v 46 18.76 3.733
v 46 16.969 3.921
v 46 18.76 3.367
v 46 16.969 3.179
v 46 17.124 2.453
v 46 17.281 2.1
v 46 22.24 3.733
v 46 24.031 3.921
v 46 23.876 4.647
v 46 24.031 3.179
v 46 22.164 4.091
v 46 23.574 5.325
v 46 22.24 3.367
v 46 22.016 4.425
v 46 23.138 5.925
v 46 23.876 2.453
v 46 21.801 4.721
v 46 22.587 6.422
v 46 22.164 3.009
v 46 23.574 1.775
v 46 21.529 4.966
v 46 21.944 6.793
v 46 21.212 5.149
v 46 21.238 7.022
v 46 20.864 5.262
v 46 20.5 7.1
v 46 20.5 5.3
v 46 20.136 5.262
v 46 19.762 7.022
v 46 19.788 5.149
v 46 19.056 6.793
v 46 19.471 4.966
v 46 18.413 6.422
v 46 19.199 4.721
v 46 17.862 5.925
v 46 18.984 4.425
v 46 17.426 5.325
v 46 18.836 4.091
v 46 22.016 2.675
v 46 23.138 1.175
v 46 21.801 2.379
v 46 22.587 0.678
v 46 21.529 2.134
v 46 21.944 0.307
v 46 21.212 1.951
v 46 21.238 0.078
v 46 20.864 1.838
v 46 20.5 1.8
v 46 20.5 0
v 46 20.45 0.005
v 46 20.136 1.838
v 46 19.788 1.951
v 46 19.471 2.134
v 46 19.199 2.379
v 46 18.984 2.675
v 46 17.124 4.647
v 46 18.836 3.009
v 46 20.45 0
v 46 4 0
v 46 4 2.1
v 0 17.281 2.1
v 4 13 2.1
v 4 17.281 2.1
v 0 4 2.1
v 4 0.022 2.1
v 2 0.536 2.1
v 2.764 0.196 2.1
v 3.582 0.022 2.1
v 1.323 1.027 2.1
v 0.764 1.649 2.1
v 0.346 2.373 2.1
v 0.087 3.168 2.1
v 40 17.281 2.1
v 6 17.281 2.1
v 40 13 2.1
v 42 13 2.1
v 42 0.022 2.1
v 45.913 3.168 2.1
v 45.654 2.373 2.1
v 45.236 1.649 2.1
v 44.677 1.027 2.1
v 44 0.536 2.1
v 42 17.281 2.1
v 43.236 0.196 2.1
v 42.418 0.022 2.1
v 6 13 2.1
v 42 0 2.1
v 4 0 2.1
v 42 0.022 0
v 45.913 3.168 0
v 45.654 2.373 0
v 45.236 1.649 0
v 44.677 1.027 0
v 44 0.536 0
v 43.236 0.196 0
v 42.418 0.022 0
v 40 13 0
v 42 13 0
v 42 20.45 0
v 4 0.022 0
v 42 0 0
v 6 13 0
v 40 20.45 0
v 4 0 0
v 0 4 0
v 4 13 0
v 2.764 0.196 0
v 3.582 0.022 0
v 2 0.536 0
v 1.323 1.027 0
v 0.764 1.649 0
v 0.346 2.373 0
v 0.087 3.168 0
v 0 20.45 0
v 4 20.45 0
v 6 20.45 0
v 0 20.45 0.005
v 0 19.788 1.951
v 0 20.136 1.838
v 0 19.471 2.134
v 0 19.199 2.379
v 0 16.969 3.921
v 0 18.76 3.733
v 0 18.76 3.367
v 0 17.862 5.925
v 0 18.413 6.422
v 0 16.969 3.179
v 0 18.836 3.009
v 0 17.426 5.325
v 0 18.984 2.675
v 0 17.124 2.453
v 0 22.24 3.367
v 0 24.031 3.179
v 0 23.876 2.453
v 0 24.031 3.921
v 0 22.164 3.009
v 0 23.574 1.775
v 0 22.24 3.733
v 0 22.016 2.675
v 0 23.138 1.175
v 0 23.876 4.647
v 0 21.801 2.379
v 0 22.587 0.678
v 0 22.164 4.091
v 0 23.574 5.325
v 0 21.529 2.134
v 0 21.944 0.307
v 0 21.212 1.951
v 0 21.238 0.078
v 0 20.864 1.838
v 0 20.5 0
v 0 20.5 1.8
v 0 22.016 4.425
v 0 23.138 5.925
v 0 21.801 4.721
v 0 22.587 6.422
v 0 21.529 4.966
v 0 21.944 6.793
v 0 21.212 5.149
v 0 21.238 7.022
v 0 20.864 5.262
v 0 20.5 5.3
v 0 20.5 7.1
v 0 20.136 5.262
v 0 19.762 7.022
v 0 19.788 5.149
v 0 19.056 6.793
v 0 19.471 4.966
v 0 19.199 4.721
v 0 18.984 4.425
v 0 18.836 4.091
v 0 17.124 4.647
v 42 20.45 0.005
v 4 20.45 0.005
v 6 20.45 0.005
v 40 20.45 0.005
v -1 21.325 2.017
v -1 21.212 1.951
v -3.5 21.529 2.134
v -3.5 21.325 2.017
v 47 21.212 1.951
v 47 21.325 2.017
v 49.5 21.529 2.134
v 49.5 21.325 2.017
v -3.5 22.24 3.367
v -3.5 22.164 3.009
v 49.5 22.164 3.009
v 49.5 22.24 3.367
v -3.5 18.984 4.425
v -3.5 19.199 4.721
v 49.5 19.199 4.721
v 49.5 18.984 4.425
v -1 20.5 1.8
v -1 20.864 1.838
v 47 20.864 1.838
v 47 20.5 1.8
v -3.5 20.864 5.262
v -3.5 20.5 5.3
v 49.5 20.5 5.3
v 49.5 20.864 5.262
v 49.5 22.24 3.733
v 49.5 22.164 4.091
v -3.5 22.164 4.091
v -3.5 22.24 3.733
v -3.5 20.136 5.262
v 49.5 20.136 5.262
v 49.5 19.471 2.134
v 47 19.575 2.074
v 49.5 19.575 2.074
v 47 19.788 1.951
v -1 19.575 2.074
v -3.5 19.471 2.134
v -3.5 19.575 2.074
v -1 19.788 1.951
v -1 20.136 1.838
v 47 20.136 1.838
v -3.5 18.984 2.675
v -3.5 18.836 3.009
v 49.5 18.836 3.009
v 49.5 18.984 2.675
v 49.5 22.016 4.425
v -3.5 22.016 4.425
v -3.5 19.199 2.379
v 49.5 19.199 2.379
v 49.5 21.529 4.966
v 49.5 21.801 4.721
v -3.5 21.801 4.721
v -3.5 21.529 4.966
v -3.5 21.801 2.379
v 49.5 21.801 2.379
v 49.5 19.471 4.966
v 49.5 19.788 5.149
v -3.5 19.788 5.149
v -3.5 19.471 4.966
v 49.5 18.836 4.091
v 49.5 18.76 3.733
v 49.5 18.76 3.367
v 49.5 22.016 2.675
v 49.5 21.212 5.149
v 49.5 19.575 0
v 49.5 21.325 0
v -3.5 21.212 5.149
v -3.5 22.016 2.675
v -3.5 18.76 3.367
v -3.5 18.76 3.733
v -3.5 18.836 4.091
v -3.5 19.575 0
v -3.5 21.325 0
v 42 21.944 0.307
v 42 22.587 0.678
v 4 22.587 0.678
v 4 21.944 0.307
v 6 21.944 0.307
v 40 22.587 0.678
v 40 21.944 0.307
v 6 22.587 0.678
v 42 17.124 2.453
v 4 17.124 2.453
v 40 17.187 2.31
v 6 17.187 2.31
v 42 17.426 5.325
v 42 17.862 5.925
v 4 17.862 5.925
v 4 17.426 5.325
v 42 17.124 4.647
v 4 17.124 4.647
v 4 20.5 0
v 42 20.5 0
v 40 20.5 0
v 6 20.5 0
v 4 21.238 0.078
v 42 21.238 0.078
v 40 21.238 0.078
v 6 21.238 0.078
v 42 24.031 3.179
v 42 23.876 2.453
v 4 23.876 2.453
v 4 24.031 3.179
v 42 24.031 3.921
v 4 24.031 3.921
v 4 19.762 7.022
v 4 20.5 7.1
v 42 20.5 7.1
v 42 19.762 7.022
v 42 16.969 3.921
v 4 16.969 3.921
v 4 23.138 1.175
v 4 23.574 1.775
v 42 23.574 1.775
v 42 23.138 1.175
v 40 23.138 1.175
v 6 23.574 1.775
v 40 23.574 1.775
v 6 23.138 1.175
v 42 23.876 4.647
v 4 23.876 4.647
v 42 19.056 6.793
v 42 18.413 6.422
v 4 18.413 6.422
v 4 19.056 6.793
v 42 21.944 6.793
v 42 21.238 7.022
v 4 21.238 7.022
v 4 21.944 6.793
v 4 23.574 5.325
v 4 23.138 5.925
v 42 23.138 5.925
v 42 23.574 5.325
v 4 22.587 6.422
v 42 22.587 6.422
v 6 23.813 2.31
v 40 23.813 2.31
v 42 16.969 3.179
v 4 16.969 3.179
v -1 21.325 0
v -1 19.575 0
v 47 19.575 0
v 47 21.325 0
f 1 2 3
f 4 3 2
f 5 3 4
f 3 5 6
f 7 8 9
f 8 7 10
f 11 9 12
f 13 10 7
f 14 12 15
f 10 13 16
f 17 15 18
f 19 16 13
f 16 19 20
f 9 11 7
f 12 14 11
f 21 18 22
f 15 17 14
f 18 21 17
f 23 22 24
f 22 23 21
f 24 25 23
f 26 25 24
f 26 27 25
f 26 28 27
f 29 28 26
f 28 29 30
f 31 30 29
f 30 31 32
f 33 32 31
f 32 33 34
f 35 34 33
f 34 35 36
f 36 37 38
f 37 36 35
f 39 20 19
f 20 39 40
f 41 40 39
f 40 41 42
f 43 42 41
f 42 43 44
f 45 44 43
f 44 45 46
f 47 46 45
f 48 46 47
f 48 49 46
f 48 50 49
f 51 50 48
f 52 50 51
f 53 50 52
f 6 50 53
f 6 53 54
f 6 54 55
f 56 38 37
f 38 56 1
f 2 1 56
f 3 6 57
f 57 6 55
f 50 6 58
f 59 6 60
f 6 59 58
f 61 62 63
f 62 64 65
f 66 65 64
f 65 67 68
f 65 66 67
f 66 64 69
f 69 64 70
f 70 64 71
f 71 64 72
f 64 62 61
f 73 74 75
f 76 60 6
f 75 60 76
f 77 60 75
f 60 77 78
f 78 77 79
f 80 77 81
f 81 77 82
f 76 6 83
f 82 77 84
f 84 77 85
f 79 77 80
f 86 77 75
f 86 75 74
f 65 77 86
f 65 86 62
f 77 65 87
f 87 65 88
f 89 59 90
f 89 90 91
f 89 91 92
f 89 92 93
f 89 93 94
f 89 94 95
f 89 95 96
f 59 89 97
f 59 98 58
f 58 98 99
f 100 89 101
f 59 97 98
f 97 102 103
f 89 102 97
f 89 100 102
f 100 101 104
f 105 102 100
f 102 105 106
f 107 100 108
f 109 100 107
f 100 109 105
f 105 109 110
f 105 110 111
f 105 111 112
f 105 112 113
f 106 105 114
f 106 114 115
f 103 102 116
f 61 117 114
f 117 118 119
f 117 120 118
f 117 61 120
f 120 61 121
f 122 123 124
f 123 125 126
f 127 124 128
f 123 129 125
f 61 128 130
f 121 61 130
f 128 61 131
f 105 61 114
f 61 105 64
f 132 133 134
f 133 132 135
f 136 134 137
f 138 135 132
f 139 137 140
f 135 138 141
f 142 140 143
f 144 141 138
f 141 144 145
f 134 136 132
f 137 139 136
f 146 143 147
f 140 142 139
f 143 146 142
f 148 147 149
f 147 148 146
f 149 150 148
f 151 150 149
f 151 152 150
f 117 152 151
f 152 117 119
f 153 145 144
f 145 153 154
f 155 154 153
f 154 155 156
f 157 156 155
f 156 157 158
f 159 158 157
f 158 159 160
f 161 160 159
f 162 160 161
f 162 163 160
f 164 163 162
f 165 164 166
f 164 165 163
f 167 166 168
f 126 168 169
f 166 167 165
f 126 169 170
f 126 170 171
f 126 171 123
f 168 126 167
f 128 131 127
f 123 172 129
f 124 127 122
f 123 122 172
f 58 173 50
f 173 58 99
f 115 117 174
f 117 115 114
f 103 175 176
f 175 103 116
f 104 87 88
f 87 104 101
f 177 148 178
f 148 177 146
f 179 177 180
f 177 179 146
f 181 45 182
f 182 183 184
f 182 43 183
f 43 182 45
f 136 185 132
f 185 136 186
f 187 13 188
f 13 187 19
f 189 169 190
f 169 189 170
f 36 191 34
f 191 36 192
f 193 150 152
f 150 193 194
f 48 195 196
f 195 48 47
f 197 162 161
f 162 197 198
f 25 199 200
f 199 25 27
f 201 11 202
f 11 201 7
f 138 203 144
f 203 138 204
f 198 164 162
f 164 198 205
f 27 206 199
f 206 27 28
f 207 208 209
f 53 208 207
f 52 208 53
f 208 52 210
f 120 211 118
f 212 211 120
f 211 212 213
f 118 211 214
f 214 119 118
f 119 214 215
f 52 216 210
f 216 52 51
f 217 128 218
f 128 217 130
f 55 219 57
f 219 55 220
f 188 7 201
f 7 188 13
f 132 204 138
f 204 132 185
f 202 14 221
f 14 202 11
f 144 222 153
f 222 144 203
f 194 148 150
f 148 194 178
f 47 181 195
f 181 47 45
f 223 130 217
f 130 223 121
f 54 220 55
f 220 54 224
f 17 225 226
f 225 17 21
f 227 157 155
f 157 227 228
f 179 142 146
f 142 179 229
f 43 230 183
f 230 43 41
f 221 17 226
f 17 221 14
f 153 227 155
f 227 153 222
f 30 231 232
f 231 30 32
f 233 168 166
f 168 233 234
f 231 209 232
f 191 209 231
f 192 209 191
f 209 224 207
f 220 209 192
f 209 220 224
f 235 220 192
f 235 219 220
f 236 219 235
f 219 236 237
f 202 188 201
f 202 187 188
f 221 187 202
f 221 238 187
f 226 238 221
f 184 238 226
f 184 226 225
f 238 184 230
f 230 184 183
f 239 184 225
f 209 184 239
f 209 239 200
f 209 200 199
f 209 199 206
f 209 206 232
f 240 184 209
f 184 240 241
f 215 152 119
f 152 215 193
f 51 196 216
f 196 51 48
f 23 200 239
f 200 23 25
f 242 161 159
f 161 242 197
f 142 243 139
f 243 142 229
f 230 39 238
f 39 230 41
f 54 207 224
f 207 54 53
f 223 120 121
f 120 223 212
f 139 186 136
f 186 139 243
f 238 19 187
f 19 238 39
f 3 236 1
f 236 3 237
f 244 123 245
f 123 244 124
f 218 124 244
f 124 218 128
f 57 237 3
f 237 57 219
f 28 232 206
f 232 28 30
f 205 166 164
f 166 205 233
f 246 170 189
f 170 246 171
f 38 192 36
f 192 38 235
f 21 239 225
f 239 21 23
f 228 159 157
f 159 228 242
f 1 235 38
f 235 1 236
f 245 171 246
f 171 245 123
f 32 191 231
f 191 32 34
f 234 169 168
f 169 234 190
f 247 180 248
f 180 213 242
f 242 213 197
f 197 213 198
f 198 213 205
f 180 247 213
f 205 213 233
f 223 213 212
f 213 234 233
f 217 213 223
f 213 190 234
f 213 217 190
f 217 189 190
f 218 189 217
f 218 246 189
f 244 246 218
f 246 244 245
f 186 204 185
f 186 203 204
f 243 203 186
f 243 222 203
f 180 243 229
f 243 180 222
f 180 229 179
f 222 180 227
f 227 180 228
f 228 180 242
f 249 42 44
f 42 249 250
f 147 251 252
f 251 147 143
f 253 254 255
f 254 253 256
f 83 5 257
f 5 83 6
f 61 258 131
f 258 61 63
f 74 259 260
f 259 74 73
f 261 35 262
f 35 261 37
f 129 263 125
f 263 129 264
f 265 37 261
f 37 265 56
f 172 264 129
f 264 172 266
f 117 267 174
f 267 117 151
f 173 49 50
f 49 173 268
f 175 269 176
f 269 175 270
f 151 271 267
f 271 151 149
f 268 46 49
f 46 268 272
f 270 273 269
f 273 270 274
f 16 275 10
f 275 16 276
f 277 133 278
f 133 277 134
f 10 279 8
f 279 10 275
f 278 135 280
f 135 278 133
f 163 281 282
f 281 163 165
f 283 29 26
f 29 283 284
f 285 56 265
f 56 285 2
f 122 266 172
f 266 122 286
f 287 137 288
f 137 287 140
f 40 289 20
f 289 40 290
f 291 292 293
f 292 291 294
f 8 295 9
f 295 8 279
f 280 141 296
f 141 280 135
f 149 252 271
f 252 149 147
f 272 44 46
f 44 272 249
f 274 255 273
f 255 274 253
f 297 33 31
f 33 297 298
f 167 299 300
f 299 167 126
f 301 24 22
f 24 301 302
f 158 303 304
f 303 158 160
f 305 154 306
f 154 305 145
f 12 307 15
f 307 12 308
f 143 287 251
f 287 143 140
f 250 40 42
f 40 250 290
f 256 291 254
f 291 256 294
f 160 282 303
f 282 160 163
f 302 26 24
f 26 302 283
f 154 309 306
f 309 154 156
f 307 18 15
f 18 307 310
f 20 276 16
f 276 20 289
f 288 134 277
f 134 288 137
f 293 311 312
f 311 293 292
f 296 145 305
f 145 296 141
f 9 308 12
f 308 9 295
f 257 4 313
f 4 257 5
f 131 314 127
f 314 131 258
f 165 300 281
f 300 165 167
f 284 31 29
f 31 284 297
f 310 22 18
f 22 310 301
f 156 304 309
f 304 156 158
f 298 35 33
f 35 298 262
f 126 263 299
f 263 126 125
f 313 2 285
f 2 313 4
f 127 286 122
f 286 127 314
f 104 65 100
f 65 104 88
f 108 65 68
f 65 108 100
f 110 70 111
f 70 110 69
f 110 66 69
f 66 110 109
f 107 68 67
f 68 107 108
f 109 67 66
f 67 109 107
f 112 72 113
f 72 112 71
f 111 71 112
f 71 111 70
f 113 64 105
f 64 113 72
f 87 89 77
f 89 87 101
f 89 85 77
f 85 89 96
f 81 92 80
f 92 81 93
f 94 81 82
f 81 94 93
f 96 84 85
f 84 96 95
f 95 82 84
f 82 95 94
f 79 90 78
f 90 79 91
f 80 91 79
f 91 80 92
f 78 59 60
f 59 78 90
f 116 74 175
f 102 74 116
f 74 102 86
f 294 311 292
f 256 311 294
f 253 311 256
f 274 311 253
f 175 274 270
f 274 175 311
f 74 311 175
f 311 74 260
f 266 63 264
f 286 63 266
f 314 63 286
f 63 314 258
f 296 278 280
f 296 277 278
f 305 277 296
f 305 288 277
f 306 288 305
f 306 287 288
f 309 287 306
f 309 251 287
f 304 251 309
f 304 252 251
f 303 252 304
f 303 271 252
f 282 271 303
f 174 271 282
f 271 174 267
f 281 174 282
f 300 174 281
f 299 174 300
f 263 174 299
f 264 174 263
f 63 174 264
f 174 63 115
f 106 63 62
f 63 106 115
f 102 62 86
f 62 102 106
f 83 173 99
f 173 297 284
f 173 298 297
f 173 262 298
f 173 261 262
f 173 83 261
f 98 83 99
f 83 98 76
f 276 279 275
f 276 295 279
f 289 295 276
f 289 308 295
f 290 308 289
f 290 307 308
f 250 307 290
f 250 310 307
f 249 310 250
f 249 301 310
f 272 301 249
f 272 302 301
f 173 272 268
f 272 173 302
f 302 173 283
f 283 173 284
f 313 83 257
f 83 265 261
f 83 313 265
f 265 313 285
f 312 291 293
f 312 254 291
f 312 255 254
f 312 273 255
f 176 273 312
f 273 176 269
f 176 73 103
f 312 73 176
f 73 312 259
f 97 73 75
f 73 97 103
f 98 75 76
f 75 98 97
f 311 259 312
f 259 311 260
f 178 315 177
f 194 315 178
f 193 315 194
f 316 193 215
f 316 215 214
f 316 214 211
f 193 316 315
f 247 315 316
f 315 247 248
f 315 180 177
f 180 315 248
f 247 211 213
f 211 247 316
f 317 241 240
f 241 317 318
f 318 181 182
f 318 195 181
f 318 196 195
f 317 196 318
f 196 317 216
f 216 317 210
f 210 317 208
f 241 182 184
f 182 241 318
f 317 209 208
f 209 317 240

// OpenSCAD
// [FL_INDEX: keywords="openscad, 3d_parametric, Customizable_Keyboard_Foot, csg_solid" | COT="Parametric OpenSCAD design from 3DCodeverse"]
// Title: Customizable Keyboard Foot

//Length of Leg
Length=46;
//Depth of Leg
Depth=24;
//Thickness at narrow side
Thickness=2.1;
//Corner radius
Corner_Radius=4;
//Length of cut away section
Leg_Length=11;
//Width of cut away section
Leg_Width=4;
// Complete height of leg
Total_Height=5.3;
//Diameter of pin
Pin_Diameter=3.5;
//Length of pin
Pin_Length=3.5;
//Height of pinn from bottom of foot
Pin_Height=1.8;
//Gap for pin support structure
Pin_Support_Gap=1;

difference(){
	union(){
		cube([Length,Depth-Pin_Diameter/2-Pin_Height,Thickness]);
		translate([-Pin_Length,Depth-Pin_Length,Pin_Height+Pin_Diameter/2])rotate(a=[0,90-0])cylinder(r=Pin_Diameter/2,h=Length+Pin_Length*2,$fn=30);
		translate([0,Depth-Pin_Length,Pin_Height+Pin_Diameter/2])rotate(a=[0,90-0])cylinder(r=Pin_Diameter/2+Pin_Height,h=Length,$fn=30);
	}
	difference(){
		translate([-Thickness,-Thickness,-Thickness/2])cube([Corner_Radius+Thickness,Corner_Radius+Thickness,Thickness*2]);
		translate([Corner_Radius,Corner_Radius,-Thickness])cylinder(r=Corner_Radius,h=Thickness*3,$fn=30);
	}
	translate([Length,0,0]){
		mirror([1,0,0]){
			difference(){
				translate([-Thickness,-Thickness,-Thickness/2])cube([Corner_Radius+Thickness,Corner_Radius+Thickness,Thickness*2]);
				translate([Corner_Radius,Corner_Radius,-Thickness])cylinder(r=Corner_Radius,h=Thickness*3,$fn=30);
			}
		}
	}
	translate([Leg_Width,Depth-Leg_Length,-Total_Height])cube([Leg_Width/2,Leg_Length*2,Total_Height*2+Pin_Diameter+Pin_Height*2]);
	translate([Length-Leg_Width*1.5,Depth-Leg_Length,-Total_Height])cube([Leg_Width/2,Leg_Length*2,Total_Height*2+Pin_Diameter+Pin_Height*2]);
	translate([Leg_Width,Leg_Width,Thickness*1.1])cube([Length-Leg_Width*2,Depth,Pin_Diameter+Pin_Height*2]);
}
translate([-Pin_Length,Depth-Pin_Diameter*.75-Pin_Height,0])cube([Pin_Length-Pin_Support_Gap,Pin_Diameter/2,Pin_Diameter/2+Pin_Height]);
translate([Length+Pin_Support_Gap,Depth-Pin_Diameter*.75-Pin_Height,0])cube([Pin_Length-Pin_Support_Gap,Pin_Diameter/2,Pin_Diameter/2+Pin_Height]);
